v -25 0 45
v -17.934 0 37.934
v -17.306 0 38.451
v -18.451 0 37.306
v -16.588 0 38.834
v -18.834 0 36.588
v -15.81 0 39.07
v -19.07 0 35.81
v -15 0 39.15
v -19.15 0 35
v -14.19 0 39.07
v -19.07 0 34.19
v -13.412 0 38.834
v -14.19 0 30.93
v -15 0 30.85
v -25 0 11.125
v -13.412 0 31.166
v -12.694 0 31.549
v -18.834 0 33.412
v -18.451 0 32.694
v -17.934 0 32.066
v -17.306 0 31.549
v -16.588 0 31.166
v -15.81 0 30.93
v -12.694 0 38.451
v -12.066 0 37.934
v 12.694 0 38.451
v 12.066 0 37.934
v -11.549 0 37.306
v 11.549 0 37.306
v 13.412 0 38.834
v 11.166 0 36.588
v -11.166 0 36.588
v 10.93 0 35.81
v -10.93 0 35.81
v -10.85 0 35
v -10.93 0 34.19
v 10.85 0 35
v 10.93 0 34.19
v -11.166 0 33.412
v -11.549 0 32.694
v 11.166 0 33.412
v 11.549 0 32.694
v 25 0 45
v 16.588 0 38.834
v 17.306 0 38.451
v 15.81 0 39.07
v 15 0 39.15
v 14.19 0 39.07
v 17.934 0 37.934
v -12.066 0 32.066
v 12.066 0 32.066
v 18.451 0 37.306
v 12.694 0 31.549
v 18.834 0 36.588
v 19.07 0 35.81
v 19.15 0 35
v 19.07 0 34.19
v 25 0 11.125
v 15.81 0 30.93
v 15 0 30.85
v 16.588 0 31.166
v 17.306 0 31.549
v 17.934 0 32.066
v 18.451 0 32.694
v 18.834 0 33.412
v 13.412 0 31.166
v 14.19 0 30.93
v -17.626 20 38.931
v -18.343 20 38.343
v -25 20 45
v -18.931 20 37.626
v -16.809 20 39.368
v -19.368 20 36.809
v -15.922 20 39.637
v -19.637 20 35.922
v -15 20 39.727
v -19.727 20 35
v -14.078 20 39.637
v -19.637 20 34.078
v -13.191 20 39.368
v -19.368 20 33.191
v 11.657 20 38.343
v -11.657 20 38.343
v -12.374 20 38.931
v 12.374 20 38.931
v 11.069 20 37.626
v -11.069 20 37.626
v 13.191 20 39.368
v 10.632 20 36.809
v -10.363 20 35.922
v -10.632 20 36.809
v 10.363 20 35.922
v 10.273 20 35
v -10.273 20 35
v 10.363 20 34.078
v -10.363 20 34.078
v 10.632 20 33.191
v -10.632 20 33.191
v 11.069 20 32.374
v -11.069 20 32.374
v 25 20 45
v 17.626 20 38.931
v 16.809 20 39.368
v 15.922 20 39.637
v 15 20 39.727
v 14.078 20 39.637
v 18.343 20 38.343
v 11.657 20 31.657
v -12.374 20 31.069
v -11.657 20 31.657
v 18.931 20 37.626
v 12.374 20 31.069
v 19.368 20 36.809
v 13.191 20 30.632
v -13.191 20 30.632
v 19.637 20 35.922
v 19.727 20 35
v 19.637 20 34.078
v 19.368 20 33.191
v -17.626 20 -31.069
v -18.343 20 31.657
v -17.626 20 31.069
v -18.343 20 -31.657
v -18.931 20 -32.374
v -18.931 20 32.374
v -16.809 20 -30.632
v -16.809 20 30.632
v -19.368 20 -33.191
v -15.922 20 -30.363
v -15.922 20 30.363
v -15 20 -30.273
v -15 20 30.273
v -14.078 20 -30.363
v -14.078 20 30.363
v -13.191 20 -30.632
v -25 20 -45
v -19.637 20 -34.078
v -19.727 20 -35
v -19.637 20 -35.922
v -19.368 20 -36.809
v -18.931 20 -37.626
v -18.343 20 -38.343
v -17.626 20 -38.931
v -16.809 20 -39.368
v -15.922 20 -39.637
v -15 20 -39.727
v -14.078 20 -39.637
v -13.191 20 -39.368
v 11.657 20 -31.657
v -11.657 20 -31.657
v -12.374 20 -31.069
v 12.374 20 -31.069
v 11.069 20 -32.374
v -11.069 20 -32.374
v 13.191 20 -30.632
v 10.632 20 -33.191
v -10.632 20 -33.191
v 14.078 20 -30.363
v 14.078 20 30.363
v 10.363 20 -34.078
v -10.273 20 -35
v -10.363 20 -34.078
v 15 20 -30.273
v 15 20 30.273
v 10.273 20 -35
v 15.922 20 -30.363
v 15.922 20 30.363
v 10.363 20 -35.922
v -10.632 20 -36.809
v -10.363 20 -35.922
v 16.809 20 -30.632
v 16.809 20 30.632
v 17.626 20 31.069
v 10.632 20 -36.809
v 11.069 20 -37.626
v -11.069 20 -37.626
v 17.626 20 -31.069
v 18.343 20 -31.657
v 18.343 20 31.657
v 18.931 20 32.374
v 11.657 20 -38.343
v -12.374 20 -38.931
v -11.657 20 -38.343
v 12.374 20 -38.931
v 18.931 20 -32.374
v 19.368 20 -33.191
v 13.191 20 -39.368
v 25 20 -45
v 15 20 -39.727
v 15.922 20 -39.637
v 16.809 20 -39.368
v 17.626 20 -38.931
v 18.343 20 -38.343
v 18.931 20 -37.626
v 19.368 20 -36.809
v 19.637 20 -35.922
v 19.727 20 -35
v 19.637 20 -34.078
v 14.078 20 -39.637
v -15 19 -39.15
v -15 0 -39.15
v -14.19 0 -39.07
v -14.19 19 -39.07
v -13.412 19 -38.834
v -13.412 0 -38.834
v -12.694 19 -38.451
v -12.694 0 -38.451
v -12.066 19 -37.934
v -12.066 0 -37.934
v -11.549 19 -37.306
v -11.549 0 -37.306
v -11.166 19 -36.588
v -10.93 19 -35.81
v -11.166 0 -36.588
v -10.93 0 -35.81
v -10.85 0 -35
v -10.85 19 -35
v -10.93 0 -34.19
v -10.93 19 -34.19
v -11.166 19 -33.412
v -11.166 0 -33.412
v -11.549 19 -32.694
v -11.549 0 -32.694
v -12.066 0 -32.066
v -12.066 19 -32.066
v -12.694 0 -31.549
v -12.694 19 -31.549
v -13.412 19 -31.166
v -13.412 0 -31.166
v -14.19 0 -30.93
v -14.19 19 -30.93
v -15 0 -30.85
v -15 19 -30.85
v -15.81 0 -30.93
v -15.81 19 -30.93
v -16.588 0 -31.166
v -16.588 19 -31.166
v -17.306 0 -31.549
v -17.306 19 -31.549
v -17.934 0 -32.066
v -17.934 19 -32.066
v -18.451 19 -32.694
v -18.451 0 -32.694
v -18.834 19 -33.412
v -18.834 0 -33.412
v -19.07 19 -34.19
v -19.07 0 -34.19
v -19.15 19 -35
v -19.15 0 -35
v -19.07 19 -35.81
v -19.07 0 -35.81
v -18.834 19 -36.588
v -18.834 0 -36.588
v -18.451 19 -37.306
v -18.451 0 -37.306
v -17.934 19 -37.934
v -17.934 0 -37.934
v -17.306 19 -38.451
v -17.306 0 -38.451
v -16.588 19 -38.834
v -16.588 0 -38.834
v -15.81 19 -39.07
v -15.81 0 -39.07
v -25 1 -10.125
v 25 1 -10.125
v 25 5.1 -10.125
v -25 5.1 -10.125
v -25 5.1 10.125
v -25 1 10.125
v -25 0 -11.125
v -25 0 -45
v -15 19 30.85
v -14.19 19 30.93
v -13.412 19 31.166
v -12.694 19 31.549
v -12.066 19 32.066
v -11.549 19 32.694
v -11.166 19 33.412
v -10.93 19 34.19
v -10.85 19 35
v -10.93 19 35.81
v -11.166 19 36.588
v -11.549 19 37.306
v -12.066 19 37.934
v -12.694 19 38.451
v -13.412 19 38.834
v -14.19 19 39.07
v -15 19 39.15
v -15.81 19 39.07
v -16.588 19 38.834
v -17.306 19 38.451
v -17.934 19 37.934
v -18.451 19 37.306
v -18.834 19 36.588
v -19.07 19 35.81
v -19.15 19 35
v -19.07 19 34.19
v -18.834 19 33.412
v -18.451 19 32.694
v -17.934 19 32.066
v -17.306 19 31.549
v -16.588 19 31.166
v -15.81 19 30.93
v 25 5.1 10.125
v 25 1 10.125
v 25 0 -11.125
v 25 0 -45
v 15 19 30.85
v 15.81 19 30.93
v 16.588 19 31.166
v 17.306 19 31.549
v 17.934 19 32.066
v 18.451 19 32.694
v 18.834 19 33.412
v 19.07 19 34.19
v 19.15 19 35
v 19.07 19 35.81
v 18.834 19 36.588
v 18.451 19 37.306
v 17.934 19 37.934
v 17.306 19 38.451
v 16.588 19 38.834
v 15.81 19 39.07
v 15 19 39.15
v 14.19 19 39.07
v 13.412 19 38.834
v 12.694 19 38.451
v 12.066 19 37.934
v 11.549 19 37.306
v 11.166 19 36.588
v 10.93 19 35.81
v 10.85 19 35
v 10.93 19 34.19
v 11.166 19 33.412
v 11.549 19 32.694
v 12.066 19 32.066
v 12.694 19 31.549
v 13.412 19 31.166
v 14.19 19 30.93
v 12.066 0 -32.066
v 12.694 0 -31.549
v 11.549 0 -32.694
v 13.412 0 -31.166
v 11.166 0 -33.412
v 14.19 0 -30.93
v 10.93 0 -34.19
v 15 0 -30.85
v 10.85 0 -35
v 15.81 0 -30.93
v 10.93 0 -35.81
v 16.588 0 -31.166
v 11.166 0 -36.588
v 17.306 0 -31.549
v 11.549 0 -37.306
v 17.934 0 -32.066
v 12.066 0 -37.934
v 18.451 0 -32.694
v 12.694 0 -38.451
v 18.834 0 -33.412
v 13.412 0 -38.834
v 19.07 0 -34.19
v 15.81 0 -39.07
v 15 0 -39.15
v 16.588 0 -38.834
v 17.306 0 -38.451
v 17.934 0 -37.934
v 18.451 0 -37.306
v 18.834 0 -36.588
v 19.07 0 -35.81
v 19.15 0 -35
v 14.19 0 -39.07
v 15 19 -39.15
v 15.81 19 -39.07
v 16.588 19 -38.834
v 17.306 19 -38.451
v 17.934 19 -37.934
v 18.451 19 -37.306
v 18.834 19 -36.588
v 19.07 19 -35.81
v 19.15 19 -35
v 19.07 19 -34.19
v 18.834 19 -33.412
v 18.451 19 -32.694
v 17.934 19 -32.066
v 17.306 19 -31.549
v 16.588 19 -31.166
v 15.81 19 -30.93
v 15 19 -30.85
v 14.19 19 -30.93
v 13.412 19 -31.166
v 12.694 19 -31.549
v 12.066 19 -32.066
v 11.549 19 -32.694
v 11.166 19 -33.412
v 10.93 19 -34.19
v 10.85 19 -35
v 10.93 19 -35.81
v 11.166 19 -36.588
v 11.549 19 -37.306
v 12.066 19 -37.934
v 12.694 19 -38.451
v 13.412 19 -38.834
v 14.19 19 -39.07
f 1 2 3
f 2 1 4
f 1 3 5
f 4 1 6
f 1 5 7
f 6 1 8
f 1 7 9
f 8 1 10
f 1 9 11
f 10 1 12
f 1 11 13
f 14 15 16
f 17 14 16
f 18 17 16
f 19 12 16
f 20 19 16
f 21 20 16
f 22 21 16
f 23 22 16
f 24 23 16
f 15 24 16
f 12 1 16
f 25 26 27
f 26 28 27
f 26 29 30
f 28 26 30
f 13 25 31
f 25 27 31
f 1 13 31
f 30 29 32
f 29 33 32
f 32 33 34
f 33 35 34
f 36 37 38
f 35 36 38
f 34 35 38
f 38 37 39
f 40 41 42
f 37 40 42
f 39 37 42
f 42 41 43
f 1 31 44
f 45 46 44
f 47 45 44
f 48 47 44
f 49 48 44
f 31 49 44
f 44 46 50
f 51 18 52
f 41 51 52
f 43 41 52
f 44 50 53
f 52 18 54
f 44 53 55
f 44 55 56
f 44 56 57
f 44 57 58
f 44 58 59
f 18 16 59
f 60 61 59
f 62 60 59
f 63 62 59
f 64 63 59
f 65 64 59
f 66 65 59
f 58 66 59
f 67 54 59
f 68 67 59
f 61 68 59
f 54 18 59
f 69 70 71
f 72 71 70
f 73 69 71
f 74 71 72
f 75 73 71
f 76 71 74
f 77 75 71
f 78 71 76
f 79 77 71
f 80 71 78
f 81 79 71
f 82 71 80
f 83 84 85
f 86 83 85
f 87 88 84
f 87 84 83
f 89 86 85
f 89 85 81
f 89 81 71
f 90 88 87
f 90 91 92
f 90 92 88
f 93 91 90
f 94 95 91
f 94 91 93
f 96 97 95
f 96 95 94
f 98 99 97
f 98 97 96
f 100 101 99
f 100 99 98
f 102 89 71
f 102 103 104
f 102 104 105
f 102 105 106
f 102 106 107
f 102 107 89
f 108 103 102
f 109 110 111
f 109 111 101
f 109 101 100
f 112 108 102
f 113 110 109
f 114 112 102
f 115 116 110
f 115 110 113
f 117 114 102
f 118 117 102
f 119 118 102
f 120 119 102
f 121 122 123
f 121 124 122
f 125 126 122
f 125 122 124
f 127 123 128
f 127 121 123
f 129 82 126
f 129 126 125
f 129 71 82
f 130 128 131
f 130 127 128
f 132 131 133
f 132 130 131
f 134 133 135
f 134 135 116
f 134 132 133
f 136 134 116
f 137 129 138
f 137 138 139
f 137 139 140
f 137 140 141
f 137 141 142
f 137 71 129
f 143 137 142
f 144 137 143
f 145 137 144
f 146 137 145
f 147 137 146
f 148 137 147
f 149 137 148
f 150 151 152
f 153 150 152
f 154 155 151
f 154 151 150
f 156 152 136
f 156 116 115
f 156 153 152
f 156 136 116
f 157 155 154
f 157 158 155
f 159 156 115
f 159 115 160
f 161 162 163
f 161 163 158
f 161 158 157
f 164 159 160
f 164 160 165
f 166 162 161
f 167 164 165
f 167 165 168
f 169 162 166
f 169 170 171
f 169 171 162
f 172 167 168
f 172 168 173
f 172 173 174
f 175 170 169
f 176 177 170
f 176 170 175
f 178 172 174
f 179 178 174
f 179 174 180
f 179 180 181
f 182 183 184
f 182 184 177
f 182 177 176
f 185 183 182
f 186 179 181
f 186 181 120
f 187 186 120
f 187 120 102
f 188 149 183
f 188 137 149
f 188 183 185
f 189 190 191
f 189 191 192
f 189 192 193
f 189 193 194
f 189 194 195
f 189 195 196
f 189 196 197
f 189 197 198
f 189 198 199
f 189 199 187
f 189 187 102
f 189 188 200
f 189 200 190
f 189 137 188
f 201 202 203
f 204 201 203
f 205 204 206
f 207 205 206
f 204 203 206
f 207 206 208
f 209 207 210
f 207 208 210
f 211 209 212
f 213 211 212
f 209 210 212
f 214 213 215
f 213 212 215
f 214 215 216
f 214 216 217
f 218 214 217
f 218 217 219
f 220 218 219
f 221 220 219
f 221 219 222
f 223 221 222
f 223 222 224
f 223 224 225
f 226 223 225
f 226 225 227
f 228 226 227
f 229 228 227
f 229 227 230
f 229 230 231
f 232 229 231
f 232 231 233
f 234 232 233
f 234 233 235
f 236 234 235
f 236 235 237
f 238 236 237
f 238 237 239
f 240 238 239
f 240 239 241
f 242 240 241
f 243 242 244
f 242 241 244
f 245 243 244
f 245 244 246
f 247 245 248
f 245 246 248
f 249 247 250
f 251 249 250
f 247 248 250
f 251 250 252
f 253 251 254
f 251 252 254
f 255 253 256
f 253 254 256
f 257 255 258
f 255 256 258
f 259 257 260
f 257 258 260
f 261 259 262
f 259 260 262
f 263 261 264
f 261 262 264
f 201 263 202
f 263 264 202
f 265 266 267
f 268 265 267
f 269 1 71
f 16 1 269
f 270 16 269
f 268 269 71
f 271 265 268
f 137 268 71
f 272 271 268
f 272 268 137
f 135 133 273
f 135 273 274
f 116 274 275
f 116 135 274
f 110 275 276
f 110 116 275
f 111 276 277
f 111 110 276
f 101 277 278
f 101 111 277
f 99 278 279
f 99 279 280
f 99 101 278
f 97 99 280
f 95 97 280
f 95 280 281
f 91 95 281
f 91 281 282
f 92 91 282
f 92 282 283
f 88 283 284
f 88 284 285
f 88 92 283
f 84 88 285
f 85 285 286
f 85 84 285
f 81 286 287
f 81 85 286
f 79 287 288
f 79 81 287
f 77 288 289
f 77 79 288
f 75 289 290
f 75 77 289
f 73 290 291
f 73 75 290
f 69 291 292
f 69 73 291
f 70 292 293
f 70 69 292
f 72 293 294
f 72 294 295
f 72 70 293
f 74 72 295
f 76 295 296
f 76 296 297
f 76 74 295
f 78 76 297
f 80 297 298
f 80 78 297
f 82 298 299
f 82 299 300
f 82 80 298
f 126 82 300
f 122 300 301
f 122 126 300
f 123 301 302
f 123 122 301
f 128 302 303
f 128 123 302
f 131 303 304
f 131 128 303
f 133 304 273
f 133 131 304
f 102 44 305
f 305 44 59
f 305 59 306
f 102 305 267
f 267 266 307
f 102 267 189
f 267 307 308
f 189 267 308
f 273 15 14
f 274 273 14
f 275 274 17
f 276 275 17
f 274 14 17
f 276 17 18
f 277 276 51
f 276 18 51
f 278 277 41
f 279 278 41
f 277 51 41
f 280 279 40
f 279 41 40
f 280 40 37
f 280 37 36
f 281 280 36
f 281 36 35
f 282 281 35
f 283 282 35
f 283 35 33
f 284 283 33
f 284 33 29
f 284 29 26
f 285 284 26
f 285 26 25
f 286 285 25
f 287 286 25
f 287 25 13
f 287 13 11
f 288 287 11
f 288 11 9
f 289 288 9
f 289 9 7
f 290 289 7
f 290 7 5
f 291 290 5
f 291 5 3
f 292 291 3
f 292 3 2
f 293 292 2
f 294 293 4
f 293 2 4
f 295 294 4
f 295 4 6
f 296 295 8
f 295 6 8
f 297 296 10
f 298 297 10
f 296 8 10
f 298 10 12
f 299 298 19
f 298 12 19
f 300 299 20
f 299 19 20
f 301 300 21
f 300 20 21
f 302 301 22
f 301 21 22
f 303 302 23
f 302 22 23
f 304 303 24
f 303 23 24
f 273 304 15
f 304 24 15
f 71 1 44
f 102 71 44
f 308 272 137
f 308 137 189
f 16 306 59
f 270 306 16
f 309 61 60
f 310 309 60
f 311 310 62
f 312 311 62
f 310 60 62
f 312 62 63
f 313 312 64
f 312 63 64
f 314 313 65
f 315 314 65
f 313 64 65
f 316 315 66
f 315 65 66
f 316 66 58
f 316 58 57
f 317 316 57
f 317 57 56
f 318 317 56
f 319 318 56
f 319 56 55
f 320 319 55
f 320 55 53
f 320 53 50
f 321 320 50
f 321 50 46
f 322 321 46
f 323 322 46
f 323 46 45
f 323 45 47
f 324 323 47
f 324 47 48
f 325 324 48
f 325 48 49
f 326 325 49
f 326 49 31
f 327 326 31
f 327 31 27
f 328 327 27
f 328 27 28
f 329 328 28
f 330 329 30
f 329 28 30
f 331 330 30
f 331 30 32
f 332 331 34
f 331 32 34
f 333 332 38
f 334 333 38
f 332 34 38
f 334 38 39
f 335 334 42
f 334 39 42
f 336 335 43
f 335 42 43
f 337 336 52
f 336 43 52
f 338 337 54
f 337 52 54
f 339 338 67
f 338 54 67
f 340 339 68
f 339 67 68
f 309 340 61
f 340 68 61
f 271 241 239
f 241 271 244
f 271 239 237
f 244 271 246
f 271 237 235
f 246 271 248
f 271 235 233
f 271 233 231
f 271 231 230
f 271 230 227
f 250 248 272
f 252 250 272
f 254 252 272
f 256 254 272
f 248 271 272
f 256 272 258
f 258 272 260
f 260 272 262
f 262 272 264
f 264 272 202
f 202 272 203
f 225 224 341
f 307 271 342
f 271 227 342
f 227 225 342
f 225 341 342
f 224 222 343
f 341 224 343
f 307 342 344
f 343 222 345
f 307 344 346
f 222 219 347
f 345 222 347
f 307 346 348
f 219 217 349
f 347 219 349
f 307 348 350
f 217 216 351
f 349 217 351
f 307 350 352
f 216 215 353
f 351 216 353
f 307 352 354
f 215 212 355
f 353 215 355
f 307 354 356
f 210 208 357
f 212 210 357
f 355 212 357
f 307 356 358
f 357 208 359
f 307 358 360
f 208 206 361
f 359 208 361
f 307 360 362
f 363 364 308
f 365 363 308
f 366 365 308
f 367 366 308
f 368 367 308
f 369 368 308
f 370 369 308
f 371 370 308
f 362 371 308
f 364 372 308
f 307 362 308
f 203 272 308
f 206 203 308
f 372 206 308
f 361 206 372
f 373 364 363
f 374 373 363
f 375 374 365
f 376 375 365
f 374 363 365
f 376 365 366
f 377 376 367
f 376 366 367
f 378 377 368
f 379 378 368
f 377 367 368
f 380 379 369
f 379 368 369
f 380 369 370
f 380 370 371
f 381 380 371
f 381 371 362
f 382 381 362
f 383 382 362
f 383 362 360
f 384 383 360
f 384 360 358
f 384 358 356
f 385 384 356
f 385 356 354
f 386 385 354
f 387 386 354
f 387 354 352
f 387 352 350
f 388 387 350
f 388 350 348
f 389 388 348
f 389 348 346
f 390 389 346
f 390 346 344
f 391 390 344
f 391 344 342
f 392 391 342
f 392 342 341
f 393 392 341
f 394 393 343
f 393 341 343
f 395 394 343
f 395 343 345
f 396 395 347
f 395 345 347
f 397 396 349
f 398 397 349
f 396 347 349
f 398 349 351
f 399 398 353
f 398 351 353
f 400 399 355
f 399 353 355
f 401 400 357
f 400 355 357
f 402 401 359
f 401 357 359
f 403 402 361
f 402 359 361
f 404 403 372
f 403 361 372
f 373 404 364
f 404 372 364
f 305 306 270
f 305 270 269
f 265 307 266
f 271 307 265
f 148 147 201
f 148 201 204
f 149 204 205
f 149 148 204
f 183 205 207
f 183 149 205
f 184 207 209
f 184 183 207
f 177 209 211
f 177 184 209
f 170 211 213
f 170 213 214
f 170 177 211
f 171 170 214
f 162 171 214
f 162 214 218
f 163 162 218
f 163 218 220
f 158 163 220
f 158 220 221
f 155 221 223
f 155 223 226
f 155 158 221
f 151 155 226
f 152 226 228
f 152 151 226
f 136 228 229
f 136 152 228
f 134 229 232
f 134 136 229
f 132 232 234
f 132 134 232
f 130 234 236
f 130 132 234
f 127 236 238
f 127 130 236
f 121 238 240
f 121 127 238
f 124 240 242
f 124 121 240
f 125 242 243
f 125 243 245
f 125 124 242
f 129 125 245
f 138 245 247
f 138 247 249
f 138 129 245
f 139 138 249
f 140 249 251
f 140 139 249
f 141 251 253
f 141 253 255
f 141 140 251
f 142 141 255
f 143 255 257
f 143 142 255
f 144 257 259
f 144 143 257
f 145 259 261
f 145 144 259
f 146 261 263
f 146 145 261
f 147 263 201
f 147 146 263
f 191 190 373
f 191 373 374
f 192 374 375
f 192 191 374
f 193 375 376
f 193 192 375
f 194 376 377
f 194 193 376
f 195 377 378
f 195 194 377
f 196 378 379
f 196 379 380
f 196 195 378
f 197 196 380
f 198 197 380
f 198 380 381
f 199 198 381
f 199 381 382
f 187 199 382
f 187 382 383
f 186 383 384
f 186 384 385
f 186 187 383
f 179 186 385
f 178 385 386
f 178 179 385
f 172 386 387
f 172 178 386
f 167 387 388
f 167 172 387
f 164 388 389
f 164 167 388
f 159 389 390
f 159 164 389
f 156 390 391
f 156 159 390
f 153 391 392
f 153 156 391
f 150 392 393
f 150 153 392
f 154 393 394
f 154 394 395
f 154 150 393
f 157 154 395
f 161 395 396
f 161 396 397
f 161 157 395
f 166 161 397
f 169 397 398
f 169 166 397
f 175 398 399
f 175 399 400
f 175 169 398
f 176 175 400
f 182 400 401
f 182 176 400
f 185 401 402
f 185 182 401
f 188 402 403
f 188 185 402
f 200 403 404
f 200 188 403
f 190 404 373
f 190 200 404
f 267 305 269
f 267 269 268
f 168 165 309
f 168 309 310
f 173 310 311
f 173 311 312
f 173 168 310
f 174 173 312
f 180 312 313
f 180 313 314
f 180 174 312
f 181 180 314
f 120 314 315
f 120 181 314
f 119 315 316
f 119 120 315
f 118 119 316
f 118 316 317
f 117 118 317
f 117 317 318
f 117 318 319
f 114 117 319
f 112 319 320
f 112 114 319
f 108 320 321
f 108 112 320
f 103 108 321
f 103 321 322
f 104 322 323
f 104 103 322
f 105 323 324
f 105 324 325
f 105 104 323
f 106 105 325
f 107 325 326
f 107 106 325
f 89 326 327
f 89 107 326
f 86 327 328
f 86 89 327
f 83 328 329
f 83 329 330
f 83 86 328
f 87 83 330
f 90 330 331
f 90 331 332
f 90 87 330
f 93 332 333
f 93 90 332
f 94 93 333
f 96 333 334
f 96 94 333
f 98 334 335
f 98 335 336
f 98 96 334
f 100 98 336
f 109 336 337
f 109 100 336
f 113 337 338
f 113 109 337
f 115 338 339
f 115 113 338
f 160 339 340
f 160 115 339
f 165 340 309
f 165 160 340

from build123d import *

# Parameters (mm, degrees)
SKETCH1_W               = 50
SKETCH1_H               = 90
BOSS_EXTRUDE1_DEPTH     = 20
SKETCH2_W               = 20.25
SKETCH2_H               = 5.1
CUT_EXTRUDE1_DEPTH      = 1
CUT_EXTRUDE1_DEPTH_BACK = 51
SKETCH3_R               = 4.15
CUT_EXTRUDE2_DEPTH      = 21
CHAMFER1_SIZE           = 1
CHAMFER1_SIZE2          = 0.577350269
CHAMFER1_PART_2_SIZE    = 1
CHAMFER1_PART_2_SIZE2   = 0.577350269
CHAMFER1_PART_3_SIZE    = 1
CHAMFER1_PART_3_SIZE2   = 0.577350269
CHAMFER1_PART_4_SIZE    = 1
CHAMFER1_PART_4_SIZE2   = 0.577350269
CHAMFER2_SIZE           = 1


with BuildPart() as part:
    # Sketch1 → Boss-Extrude1 (new body)
    with BuildSketch(Plane(origin=(0, 0, 0), x_dir=(1, 0, 0), z_dir=(0, 1, 0))):
        Rectangle(SKETCH1_W, SKETCH1_H)
    extrude(amount=BOSS_EXTRUDE1_DEPTH)

    # Sketch2 → Cut-Extrude1 (cut, two sides)
    with BuildSketch(Plane(origin=(25, 0, 0), x_dir=(0, 0, -1), z_dir=(1, 0, 0))) as cut_extrude1_sk:
        with Locations((0, 2.55)):
            Rectangle(SKETCH2_W, SKETCH2_H)
    extrude(amount=CUT_EXTRUDE1_DEPTH, mode=Mode.SUBTRACT)
    extrude(cut_extrude1_sk.sketch, amount=-CUT_EXTRUDE1_DEPTH_BACK, mode=Mode.SUBTRACT)

    # Sketch3 → Cut-Extrude2 (cut, through all)
    with BuildSketch(Plane.XZ):
        with Locations(Location((-15, 35, 0), (0, 0, 270))):  # turned: the seam where the file's is
            Circle(SKETCH3_R)
        with Locations(Location((-15, -35, 0), (0, 0, 270))):  # turned: the seam where the file's is
            Circle(SKETCH3_R)
        with Locations(Location((15, 35, 0), (0, 0, 270))):  # turned: the seam where the file's is
            Circle(SKETCH3_R)
        with Locations(Location((15, -35, 0), (0, 0, 270))):  # turned: the seam where the file's is
            Circle(SKETCH3_R)
    extrude(amount=-CUT_EXTRUDE2_DEPTH, mode=Mode.SUBTRACT)

    # Chamfer1
    chamfer1_edges = [part.edges().sort_by_distance(p)[0] for p in [
        (-15, 20, 39.15),
    ]]
    chamfer1_side = [part.faces().sort_by_distance(p)[0] for p in [
        (-15, 10, 39.15),
    ]]
    chamfer(chamfer1_edges, length=CHAMFER1_SIZE, length2=CHAMFER1_SIZE2, reference=chamfer1_side[0])

    # Chamfer1 part 2
    chamfer1_part_2_edges = [part.edges().sort_by_distance(p)[0] for p in [
        (15, 20, 39.15),
    ]]
    chamfer1_part_2_side = [part.faces().sort_by_distance(p)[0] for p in [
        (15, 10, 39.15),
    ]]
    chamfer(chamfer1_part_2_edges, length=CHAMFER1_PART_2_SIZE, length2=CHAMFER1_PART_2_SIZE2, reference=chamfer1_part_2_side[0])

    # Chamfer1 part 3
    chamfer1_part_3_edges = [part.edges().sort_by_distance(p)[0] for p in [
        (15, 20, -30.85),
    ]]
    chamfer1_part_3_side = [part.faces().sort_by_distance(p)[0] for p in [
        (15, 10, -30.85),
    ]]
    chamfer(chamfer1_part_3_edges, length=CHAMFER1_PART_3_SIZE, length2=CHAMFER1_PART_3_SIZE2, reference=chamfer1_part_3_side[0])

    # Chamfer1 part 4
    chamfer1_part_4_edges = [part.edges().sort_by_distance(p)[0] for p in [
        (-15, 20, -30.85),
    ]]
    chamfer1_part_4_side = [part.faces().sort_by_distance(p)[0] for p in [
        (-15, 10, -30.85),
    ]]
    chamfer(chamfer1_part_4_edges, length=CHAMFER1_PART_4_SIZE, length2=CHAMFER1_PART_4_SIZE2, reference=chamfer1_part_4_side[0])

    # Chamfer2
    chamfer2_edges = [part.edges().sort_by_distance(p)[0] for p in [
        (0, 0, -10.125),
        (0, 0, 10.125),
    ]]
    chamfer(chamfer2_edges, length=CHAMFER2_SIZE)


solid = part.part
